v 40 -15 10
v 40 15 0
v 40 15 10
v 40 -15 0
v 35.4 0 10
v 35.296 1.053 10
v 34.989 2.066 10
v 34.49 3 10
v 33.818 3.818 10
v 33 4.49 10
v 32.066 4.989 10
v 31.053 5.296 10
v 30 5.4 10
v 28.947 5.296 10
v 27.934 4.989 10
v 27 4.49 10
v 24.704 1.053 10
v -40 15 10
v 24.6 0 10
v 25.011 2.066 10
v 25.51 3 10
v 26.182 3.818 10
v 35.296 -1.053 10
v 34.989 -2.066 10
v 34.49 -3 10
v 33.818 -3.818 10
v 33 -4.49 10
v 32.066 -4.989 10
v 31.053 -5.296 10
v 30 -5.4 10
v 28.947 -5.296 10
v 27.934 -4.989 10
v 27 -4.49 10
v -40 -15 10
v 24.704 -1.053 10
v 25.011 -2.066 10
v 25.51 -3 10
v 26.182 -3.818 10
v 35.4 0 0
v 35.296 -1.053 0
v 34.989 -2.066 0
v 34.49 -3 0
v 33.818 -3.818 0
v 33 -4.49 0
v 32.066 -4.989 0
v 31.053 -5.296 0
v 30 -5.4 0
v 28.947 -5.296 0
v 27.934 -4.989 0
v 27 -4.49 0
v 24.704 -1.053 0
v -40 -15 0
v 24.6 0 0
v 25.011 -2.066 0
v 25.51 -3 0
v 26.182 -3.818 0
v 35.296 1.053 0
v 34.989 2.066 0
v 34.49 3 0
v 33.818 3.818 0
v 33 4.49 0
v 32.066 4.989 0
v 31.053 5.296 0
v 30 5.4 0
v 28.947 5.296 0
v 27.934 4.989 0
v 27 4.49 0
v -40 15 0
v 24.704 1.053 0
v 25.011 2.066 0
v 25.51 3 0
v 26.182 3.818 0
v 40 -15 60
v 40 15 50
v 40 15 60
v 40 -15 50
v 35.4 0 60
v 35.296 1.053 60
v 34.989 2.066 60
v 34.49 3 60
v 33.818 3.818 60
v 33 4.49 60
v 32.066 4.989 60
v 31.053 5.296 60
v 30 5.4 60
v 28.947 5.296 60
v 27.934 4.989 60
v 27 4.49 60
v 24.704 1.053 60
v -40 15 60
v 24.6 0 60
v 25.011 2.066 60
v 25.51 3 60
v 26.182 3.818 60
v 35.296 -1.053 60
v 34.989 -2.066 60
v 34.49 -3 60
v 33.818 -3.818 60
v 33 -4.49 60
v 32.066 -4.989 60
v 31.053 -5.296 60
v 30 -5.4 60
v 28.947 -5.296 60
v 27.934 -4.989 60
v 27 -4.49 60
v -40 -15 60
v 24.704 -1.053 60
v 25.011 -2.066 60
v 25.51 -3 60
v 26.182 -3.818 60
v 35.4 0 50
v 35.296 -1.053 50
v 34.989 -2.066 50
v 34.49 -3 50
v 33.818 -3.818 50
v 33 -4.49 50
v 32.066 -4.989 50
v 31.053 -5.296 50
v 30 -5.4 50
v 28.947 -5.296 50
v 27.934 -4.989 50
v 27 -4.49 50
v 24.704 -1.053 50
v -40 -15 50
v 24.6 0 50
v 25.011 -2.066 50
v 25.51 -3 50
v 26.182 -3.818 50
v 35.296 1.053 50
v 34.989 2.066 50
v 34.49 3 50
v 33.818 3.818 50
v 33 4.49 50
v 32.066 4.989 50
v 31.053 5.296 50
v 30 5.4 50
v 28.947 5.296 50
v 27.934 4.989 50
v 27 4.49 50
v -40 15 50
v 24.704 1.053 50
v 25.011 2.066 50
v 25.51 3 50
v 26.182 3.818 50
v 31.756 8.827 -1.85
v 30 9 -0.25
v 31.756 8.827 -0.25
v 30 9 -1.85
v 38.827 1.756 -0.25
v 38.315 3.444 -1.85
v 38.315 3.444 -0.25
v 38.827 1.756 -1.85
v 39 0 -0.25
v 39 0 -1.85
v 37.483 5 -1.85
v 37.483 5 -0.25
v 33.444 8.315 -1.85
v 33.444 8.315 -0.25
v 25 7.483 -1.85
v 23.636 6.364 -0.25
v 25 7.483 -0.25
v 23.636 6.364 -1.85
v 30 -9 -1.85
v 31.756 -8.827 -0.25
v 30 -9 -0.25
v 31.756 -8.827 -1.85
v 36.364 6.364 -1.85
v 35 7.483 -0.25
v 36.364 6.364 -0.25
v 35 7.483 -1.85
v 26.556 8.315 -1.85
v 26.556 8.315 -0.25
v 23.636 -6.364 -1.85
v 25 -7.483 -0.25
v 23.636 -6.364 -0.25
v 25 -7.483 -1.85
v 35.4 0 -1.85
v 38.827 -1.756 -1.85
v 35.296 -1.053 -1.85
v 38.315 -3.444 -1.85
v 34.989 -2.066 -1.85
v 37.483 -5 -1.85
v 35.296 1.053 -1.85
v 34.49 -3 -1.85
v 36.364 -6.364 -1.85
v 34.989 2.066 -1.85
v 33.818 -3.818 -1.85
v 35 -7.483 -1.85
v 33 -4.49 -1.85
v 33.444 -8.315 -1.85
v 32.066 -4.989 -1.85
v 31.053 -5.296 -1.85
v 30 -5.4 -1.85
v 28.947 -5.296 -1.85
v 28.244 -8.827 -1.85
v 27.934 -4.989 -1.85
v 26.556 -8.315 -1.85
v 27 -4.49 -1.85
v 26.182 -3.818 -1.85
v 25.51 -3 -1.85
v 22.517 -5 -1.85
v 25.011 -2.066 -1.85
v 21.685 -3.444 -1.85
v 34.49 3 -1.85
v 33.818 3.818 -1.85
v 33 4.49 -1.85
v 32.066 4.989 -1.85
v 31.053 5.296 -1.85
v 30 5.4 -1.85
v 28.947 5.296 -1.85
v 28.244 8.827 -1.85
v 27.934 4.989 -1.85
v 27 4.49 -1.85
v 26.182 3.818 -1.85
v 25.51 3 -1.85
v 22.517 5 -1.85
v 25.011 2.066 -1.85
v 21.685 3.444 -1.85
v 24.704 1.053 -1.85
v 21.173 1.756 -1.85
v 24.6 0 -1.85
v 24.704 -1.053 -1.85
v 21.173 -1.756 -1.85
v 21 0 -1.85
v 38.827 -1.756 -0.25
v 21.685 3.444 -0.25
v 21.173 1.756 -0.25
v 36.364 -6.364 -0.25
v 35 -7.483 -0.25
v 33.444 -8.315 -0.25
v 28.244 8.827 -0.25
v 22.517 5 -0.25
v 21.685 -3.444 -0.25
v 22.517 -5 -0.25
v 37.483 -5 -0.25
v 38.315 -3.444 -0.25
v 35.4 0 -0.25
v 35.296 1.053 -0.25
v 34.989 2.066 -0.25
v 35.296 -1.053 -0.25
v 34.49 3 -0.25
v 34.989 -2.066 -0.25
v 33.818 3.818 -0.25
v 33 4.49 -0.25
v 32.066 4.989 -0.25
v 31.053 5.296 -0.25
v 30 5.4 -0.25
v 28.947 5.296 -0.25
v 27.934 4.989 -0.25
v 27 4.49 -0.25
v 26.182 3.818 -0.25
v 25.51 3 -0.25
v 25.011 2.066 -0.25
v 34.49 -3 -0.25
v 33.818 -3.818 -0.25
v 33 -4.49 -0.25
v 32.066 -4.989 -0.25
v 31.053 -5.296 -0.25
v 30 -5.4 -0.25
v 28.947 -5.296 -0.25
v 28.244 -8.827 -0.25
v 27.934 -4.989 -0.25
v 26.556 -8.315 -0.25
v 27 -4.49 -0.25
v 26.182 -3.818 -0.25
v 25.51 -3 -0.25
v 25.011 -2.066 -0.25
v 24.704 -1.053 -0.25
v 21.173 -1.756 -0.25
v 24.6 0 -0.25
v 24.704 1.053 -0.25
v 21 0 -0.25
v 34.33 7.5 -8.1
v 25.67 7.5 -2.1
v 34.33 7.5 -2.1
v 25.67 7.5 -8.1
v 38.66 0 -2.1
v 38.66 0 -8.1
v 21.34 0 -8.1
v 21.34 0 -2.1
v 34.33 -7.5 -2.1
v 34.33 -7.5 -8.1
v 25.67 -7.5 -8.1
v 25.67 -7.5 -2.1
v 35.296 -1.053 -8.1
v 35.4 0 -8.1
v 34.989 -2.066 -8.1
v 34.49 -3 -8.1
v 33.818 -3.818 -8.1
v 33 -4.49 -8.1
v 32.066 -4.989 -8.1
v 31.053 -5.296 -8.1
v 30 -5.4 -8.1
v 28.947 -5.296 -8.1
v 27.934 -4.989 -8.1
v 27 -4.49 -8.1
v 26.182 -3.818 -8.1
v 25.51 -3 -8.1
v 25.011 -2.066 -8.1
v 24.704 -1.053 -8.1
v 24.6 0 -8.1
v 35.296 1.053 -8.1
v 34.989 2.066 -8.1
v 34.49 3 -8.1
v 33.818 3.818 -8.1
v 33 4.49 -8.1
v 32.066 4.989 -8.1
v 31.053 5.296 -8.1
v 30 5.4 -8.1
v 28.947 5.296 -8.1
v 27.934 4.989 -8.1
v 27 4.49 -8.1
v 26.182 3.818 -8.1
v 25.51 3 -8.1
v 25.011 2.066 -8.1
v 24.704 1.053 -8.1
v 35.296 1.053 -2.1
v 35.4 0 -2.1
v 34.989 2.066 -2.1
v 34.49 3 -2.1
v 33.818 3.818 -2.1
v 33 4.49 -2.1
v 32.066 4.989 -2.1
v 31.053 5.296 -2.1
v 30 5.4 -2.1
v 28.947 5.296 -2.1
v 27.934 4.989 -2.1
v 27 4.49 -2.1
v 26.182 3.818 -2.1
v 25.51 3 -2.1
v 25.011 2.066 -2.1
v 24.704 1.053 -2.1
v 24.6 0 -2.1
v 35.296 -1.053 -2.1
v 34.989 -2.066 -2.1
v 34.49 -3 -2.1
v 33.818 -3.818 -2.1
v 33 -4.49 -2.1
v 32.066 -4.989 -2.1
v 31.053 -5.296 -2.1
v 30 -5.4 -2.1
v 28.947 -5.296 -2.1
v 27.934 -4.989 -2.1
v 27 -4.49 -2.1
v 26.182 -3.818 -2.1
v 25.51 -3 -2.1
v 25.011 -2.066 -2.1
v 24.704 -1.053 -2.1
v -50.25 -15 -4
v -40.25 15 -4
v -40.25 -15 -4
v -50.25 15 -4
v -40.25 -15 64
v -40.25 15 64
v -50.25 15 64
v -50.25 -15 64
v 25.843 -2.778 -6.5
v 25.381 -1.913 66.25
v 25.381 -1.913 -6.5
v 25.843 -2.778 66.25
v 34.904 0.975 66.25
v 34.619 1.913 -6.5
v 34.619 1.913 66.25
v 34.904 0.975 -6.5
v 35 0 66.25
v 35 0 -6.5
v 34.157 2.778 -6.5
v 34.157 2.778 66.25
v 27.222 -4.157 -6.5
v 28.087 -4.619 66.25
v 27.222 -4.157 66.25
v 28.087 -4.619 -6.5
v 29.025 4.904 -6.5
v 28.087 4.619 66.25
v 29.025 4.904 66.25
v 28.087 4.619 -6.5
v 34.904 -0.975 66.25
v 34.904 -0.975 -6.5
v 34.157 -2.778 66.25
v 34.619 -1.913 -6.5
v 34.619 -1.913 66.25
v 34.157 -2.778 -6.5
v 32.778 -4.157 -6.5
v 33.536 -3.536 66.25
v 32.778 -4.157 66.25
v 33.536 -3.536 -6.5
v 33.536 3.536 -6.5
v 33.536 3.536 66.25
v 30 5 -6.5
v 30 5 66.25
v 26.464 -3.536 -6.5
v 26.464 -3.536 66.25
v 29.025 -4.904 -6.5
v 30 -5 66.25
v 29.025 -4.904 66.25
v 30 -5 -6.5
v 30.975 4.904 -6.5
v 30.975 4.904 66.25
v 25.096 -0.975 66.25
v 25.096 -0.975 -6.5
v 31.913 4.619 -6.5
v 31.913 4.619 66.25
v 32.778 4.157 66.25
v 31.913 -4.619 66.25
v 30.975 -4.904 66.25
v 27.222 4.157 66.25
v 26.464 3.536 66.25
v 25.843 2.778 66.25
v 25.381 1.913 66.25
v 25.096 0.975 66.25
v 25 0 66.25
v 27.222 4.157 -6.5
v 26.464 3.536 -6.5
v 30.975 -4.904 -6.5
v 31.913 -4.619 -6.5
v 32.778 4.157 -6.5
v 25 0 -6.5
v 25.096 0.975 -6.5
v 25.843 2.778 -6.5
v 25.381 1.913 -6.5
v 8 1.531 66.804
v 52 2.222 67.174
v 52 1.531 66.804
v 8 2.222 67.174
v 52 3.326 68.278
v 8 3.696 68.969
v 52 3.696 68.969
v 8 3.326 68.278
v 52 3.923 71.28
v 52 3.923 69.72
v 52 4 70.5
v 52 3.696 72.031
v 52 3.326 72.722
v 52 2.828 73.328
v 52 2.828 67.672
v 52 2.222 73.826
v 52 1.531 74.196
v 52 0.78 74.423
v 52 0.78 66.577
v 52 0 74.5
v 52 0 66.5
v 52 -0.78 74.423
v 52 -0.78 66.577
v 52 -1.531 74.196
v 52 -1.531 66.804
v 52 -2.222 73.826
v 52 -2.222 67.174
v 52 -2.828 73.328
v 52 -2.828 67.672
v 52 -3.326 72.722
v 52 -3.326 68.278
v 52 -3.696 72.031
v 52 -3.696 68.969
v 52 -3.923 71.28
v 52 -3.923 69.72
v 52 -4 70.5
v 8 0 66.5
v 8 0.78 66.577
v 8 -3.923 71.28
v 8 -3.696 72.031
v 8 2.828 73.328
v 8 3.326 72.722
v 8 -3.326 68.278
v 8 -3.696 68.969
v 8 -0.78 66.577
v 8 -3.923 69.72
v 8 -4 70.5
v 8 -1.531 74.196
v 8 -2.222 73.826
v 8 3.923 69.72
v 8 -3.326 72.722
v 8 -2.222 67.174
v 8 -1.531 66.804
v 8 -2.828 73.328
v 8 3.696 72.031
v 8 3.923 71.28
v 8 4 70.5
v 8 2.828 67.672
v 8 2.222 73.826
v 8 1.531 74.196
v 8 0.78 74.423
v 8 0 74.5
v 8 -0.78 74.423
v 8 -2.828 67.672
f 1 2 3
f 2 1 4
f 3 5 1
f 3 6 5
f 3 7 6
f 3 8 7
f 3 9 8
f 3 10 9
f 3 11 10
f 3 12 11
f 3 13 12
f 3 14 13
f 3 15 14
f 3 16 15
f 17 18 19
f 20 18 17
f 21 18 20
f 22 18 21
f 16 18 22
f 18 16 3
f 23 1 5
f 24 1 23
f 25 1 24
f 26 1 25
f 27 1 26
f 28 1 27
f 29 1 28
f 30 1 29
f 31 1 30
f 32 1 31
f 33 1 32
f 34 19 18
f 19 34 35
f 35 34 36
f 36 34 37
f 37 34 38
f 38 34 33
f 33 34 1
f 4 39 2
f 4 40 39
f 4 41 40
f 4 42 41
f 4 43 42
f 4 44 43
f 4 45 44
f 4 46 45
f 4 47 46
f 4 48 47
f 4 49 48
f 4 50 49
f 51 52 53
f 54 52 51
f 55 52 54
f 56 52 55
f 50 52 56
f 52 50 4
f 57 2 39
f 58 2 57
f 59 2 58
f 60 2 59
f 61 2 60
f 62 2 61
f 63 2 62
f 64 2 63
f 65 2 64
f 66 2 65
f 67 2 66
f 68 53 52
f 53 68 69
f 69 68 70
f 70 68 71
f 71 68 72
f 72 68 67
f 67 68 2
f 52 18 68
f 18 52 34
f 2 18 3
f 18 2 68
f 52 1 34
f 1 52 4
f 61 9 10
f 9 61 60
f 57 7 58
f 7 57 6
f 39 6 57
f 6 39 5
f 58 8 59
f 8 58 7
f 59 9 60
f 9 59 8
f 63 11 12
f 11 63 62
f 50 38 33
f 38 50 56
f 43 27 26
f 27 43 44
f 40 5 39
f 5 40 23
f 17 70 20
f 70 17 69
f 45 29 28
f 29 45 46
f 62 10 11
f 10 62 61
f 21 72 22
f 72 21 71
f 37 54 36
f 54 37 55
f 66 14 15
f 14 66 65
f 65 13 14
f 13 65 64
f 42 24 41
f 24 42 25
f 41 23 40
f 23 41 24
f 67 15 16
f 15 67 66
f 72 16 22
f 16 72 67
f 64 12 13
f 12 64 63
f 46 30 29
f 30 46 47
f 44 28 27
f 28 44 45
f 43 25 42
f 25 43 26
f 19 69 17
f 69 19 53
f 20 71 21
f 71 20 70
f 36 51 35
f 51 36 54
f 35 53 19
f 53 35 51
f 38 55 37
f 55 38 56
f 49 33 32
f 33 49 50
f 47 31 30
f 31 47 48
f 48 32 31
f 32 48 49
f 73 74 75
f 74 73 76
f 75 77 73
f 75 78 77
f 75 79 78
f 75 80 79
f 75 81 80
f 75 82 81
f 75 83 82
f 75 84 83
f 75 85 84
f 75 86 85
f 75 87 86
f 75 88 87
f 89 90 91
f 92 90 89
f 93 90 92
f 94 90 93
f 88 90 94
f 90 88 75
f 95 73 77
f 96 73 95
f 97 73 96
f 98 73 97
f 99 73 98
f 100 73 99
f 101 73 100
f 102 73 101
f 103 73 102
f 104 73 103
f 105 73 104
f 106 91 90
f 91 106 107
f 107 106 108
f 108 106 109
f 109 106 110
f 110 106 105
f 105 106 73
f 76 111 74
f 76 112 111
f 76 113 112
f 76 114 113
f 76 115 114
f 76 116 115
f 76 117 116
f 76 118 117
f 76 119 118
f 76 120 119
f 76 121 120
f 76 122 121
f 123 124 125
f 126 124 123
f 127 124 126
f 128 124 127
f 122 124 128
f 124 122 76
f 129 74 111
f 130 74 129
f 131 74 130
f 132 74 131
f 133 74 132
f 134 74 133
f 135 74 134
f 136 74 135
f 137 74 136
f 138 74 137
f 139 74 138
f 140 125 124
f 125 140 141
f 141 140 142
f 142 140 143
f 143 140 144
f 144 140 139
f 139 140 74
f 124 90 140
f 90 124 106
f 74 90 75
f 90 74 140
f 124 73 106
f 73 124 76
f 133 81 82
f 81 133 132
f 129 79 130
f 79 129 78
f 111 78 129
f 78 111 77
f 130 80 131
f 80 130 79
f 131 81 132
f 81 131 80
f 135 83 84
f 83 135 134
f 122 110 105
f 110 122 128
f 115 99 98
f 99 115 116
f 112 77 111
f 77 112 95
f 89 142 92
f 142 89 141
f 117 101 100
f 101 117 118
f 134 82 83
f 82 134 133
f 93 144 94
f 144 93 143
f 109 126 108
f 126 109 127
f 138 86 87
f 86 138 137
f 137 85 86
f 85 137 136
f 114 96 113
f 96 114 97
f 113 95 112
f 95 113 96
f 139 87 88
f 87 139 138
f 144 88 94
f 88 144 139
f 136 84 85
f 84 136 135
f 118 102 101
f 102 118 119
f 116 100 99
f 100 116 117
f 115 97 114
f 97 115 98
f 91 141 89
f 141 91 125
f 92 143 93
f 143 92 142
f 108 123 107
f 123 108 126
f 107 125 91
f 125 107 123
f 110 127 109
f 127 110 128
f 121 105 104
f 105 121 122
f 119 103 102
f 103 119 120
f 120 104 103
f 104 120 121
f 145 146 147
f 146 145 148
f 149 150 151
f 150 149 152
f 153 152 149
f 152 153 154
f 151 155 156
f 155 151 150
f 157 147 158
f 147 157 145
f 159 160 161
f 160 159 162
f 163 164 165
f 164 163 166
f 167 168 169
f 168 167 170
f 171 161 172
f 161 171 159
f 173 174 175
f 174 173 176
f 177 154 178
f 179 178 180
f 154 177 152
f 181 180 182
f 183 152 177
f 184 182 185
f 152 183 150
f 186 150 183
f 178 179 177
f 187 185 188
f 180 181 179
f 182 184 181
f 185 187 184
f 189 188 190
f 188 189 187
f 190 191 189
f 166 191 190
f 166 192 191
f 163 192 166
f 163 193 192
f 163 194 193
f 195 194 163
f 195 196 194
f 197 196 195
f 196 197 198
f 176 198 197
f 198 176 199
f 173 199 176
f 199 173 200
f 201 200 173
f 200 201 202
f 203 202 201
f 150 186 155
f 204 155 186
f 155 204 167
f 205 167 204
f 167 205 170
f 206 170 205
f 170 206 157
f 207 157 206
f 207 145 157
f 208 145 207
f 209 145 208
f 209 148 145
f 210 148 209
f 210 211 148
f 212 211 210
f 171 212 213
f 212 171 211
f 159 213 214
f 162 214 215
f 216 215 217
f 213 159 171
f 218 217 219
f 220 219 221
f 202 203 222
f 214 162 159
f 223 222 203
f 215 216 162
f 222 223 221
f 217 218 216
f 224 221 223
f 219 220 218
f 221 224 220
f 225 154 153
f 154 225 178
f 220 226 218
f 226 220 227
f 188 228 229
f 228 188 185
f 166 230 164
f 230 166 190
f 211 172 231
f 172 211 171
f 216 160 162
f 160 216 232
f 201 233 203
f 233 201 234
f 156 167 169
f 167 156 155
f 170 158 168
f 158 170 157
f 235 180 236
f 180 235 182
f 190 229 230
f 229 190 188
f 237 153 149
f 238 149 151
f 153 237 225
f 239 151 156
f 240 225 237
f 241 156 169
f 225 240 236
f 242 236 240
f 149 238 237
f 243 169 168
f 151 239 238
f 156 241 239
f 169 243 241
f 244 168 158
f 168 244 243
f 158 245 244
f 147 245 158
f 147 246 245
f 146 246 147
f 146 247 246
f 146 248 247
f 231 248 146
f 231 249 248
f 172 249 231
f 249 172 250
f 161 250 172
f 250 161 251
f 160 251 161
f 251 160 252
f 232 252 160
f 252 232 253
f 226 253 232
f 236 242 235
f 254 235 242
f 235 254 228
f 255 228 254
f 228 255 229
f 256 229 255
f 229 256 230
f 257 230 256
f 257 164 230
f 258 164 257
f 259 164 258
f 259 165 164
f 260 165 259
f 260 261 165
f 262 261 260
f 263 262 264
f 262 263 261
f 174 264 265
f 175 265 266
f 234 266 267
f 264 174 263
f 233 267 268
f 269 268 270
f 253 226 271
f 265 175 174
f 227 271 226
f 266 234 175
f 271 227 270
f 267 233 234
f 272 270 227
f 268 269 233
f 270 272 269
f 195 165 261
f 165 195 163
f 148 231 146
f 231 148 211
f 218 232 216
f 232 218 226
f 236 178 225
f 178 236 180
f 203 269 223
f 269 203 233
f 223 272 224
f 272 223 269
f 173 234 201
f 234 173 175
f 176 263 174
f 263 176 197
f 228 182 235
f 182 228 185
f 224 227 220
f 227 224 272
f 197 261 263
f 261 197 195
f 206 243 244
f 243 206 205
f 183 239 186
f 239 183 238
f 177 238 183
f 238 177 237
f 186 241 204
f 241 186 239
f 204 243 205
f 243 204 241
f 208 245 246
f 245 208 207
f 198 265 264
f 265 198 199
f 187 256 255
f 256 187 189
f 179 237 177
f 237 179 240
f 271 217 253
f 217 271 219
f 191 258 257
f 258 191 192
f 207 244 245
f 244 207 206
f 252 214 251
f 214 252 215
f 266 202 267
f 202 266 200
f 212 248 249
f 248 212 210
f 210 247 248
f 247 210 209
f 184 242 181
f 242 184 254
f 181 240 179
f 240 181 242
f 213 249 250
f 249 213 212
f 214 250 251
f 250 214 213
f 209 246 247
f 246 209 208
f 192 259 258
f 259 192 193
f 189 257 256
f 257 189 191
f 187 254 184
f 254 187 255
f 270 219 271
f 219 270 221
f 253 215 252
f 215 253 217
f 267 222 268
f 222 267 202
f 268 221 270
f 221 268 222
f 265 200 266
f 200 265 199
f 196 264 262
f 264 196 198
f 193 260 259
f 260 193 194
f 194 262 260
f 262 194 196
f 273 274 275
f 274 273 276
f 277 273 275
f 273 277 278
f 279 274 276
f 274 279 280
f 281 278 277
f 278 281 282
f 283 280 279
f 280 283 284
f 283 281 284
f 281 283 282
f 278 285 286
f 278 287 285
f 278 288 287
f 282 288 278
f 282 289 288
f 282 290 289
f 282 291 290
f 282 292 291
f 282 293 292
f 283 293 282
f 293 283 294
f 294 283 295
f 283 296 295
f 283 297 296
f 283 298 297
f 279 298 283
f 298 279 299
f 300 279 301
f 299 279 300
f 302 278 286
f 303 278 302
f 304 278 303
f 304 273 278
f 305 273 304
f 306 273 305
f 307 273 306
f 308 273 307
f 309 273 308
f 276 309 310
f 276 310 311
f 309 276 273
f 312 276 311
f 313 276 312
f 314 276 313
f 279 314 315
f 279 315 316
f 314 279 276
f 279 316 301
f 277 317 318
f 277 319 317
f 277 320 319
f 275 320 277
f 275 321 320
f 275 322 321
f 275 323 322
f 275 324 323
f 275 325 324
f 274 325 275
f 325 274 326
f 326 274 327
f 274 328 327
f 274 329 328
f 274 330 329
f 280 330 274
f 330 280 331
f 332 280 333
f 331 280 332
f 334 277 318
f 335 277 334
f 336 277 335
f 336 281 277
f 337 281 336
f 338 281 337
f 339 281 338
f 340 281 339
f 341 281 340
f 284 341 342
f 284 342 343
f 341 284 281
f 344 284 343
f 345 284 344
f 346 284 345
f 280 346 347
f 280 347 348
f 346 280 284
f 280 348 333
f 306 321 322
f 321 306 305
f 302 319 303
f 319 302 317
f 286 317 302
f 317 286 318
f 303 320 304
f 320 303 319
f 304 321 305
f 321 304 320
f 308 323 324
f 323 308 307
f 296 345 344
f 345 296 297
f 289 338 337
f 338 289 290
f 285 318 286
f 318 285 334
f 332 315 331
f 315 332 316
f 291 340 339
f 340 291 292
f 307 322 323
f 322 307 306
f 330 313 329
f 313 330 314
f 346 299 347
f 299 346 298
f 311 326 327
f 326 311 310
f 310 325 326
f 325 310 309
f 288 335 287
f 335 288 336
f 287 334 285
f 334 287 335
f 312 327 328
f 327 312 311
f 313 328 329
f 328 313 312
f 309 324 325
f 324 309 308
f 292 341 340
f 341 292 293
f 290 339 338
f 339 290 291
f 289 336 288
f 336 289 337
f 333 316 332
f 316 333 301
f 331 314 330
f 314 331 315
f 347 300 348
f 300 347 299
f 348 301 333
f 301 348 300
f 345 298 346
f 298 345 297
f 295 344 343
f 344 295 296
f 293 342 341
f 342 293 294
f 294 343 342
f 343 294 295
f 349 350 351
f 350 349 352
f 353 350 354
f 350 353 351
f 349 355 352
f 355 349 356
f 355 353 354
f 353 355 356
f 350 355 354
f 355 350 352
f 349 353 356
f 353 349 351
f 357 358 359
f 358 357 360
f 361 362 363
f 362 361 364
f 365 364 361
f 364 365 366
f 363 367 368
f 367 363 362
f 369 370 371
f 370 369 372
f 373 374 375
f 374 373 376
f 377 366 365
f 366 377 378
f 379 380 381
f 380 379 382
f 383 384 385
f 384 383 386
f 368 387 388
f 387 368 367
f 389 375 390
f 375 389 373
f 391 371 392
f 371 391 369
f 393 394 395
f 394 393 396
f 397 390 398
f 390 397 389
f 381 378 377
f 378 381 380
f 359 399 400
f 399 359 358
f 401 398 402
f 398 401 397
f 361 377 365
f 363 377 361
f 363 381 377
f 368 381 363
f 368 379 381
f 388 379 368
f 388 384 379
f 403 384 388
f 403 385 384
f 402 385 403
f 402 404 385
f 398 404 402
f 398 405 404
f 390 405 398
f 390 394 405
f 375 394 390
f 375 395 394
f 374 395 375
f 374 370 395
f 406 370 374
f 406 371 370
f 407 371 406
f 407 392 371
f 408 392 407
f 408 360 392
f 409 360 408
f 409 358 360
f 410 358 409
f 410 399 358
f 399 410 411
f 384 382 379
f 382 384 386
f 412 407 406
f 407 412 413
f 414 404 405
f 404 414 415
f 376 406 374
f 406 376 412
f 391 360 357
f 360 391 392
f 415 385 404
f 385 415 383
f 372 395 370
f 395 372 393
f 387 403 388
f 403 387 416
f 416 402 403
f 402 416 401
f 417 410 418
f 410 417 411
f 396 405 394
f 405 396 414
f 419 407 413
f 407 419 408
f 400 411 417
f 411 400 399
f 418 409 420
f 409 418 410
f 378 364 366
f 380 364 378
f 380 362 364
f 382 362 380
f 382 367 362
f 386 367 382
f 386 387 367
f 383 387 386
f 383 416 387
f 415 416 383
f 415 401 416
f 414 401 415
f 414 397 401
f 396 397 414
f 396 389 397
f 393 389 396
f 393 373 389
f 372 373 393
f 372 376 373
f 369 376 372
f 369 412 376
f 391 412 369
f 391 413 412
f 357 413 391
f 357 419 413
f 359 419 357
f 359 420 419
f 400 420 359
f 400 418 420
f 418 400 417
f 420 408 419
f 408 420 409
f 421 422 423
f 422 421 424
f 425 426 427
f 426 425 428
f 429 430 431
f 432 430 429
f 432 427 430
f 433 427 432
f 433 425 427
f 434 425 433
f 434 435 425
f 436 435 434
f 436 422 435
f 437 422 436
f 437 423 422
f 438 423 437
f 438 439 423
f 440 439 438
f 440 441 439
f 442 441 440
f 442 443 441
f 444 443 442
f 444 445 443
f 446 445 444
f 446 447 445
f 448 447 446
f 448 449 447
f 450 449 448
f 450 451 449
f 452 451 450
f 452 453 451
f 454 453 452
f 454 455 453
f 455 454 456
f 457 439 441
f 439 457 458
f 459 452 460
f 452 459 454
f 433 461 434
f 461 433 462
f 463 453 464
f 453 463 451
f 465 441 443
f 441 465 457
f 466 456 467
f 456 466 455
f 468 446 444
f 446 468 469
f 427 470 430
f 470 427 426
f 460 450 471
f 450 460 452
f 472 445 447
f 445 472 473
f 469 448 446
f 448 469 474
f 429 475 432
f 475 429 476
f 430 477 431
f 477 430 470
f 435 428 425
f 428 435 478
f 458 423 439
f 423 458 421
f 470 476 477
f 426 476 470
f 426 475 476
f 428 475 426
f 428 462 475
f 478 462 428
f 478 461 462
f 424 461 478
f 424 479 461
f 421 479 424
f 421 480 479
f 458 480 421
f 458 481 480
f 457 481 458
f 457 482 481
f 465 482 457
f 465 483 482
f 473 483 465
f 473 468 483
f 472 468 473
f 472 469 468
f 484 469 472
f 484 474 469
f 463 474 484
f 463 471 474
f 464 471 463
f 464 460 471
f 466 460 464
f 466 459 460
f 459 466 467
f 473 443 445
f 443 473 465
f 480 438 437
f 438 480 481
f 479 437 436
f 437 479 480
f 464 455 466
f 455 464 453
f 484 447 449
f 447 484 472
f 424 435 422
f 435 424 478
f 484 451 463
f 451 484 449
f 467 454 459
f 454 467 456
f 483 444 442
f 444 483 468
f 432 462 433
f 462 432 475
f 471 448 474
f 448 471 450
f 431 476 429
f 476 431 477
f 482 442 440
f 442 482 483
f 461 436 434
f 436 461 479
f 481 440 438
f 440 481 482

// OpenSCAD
$fn = 32;

// ------------------------------------------------------------------------
// C clamp: throat 50 mm, screw d10
// Every part is its own module, assembly() places every instance.
// ------------------------------------------------------------------------

// --- part 1 ---
module clamp_arm() {
  difference() {
    translate([-40, -15, 0]) cube([80, 30, 10]);
    translate([30, 0, -1]) cylinder(h = 12, d = 10.8);
  }
}

// --- part 2 ---
module clamp_spine() {
  difference() {
    translate([-34, -15, 0]) cube([68, 30, 10]);
  }
}

// --- part 3 ---
module clamp_screw() {
  translate([0, 0, -36.375]) cylinder(h = 72.75, d = 10);
}

// --- part 4 ---
module clamp_washer() {
  difference() {
      translate([0, 0, 0]) cylinder(h = 1.6, d = 18);
      translate([0, 0, -1]) cylinder(h = 3.6, d = 10.8);
    }
}

// --- part 5 ---
module clamp_nut() {
  difference() {
    linear_extrude(height = 6) polygon(points = [[8.66, 0], [4.33, 7.5], [-4.33, 7.5], [-8.66, 0], [-4.33, -7.5], [4.33, -7.5]]);
    translate([0, 0, -1]) cylinder(h = 8, d = 10.8);
  }
}

// --- part 6 ---
module tommy_bar() {
  translate([0, 0, -22]) cylinder(h = 44, d = 8);
}

// --- assembly ---
module assembly() {
  color([0.80, 0.24, 0.20]) translate([0, 0, 0]) rotate([0, 0, 0]) clamp_arm();
  color([0.20, 0.45, 0.75]) translate([0, 0, 50]) rotate([0, 0, 0]) clamp_arm();
  color([0.25, 0.62, 0.32]) translate([-50.25, 0, 30]) rotate([0, 90, 0]) clamp_spine();
  color([0.92, 0.70, 0.18]) translate([30, 0, 29.875]) rotate([0, 0, 0]) clamp_screw();
  color([0.58, 0.35, 0.70]) translate([30, 0, -1.85]) rotate([0, 0, 0]) clamp_washer();
  color([0.16, 0.66, 0.66]) translate([30, 0, -8.1]) rotate([0, 0, 0]) clamp_nut();
  color([0.85, 0.48, 0.18]) translate([30, 0, 70.5]) rotate([0, 90, 0]) tommy_bar();
}

assembly();
